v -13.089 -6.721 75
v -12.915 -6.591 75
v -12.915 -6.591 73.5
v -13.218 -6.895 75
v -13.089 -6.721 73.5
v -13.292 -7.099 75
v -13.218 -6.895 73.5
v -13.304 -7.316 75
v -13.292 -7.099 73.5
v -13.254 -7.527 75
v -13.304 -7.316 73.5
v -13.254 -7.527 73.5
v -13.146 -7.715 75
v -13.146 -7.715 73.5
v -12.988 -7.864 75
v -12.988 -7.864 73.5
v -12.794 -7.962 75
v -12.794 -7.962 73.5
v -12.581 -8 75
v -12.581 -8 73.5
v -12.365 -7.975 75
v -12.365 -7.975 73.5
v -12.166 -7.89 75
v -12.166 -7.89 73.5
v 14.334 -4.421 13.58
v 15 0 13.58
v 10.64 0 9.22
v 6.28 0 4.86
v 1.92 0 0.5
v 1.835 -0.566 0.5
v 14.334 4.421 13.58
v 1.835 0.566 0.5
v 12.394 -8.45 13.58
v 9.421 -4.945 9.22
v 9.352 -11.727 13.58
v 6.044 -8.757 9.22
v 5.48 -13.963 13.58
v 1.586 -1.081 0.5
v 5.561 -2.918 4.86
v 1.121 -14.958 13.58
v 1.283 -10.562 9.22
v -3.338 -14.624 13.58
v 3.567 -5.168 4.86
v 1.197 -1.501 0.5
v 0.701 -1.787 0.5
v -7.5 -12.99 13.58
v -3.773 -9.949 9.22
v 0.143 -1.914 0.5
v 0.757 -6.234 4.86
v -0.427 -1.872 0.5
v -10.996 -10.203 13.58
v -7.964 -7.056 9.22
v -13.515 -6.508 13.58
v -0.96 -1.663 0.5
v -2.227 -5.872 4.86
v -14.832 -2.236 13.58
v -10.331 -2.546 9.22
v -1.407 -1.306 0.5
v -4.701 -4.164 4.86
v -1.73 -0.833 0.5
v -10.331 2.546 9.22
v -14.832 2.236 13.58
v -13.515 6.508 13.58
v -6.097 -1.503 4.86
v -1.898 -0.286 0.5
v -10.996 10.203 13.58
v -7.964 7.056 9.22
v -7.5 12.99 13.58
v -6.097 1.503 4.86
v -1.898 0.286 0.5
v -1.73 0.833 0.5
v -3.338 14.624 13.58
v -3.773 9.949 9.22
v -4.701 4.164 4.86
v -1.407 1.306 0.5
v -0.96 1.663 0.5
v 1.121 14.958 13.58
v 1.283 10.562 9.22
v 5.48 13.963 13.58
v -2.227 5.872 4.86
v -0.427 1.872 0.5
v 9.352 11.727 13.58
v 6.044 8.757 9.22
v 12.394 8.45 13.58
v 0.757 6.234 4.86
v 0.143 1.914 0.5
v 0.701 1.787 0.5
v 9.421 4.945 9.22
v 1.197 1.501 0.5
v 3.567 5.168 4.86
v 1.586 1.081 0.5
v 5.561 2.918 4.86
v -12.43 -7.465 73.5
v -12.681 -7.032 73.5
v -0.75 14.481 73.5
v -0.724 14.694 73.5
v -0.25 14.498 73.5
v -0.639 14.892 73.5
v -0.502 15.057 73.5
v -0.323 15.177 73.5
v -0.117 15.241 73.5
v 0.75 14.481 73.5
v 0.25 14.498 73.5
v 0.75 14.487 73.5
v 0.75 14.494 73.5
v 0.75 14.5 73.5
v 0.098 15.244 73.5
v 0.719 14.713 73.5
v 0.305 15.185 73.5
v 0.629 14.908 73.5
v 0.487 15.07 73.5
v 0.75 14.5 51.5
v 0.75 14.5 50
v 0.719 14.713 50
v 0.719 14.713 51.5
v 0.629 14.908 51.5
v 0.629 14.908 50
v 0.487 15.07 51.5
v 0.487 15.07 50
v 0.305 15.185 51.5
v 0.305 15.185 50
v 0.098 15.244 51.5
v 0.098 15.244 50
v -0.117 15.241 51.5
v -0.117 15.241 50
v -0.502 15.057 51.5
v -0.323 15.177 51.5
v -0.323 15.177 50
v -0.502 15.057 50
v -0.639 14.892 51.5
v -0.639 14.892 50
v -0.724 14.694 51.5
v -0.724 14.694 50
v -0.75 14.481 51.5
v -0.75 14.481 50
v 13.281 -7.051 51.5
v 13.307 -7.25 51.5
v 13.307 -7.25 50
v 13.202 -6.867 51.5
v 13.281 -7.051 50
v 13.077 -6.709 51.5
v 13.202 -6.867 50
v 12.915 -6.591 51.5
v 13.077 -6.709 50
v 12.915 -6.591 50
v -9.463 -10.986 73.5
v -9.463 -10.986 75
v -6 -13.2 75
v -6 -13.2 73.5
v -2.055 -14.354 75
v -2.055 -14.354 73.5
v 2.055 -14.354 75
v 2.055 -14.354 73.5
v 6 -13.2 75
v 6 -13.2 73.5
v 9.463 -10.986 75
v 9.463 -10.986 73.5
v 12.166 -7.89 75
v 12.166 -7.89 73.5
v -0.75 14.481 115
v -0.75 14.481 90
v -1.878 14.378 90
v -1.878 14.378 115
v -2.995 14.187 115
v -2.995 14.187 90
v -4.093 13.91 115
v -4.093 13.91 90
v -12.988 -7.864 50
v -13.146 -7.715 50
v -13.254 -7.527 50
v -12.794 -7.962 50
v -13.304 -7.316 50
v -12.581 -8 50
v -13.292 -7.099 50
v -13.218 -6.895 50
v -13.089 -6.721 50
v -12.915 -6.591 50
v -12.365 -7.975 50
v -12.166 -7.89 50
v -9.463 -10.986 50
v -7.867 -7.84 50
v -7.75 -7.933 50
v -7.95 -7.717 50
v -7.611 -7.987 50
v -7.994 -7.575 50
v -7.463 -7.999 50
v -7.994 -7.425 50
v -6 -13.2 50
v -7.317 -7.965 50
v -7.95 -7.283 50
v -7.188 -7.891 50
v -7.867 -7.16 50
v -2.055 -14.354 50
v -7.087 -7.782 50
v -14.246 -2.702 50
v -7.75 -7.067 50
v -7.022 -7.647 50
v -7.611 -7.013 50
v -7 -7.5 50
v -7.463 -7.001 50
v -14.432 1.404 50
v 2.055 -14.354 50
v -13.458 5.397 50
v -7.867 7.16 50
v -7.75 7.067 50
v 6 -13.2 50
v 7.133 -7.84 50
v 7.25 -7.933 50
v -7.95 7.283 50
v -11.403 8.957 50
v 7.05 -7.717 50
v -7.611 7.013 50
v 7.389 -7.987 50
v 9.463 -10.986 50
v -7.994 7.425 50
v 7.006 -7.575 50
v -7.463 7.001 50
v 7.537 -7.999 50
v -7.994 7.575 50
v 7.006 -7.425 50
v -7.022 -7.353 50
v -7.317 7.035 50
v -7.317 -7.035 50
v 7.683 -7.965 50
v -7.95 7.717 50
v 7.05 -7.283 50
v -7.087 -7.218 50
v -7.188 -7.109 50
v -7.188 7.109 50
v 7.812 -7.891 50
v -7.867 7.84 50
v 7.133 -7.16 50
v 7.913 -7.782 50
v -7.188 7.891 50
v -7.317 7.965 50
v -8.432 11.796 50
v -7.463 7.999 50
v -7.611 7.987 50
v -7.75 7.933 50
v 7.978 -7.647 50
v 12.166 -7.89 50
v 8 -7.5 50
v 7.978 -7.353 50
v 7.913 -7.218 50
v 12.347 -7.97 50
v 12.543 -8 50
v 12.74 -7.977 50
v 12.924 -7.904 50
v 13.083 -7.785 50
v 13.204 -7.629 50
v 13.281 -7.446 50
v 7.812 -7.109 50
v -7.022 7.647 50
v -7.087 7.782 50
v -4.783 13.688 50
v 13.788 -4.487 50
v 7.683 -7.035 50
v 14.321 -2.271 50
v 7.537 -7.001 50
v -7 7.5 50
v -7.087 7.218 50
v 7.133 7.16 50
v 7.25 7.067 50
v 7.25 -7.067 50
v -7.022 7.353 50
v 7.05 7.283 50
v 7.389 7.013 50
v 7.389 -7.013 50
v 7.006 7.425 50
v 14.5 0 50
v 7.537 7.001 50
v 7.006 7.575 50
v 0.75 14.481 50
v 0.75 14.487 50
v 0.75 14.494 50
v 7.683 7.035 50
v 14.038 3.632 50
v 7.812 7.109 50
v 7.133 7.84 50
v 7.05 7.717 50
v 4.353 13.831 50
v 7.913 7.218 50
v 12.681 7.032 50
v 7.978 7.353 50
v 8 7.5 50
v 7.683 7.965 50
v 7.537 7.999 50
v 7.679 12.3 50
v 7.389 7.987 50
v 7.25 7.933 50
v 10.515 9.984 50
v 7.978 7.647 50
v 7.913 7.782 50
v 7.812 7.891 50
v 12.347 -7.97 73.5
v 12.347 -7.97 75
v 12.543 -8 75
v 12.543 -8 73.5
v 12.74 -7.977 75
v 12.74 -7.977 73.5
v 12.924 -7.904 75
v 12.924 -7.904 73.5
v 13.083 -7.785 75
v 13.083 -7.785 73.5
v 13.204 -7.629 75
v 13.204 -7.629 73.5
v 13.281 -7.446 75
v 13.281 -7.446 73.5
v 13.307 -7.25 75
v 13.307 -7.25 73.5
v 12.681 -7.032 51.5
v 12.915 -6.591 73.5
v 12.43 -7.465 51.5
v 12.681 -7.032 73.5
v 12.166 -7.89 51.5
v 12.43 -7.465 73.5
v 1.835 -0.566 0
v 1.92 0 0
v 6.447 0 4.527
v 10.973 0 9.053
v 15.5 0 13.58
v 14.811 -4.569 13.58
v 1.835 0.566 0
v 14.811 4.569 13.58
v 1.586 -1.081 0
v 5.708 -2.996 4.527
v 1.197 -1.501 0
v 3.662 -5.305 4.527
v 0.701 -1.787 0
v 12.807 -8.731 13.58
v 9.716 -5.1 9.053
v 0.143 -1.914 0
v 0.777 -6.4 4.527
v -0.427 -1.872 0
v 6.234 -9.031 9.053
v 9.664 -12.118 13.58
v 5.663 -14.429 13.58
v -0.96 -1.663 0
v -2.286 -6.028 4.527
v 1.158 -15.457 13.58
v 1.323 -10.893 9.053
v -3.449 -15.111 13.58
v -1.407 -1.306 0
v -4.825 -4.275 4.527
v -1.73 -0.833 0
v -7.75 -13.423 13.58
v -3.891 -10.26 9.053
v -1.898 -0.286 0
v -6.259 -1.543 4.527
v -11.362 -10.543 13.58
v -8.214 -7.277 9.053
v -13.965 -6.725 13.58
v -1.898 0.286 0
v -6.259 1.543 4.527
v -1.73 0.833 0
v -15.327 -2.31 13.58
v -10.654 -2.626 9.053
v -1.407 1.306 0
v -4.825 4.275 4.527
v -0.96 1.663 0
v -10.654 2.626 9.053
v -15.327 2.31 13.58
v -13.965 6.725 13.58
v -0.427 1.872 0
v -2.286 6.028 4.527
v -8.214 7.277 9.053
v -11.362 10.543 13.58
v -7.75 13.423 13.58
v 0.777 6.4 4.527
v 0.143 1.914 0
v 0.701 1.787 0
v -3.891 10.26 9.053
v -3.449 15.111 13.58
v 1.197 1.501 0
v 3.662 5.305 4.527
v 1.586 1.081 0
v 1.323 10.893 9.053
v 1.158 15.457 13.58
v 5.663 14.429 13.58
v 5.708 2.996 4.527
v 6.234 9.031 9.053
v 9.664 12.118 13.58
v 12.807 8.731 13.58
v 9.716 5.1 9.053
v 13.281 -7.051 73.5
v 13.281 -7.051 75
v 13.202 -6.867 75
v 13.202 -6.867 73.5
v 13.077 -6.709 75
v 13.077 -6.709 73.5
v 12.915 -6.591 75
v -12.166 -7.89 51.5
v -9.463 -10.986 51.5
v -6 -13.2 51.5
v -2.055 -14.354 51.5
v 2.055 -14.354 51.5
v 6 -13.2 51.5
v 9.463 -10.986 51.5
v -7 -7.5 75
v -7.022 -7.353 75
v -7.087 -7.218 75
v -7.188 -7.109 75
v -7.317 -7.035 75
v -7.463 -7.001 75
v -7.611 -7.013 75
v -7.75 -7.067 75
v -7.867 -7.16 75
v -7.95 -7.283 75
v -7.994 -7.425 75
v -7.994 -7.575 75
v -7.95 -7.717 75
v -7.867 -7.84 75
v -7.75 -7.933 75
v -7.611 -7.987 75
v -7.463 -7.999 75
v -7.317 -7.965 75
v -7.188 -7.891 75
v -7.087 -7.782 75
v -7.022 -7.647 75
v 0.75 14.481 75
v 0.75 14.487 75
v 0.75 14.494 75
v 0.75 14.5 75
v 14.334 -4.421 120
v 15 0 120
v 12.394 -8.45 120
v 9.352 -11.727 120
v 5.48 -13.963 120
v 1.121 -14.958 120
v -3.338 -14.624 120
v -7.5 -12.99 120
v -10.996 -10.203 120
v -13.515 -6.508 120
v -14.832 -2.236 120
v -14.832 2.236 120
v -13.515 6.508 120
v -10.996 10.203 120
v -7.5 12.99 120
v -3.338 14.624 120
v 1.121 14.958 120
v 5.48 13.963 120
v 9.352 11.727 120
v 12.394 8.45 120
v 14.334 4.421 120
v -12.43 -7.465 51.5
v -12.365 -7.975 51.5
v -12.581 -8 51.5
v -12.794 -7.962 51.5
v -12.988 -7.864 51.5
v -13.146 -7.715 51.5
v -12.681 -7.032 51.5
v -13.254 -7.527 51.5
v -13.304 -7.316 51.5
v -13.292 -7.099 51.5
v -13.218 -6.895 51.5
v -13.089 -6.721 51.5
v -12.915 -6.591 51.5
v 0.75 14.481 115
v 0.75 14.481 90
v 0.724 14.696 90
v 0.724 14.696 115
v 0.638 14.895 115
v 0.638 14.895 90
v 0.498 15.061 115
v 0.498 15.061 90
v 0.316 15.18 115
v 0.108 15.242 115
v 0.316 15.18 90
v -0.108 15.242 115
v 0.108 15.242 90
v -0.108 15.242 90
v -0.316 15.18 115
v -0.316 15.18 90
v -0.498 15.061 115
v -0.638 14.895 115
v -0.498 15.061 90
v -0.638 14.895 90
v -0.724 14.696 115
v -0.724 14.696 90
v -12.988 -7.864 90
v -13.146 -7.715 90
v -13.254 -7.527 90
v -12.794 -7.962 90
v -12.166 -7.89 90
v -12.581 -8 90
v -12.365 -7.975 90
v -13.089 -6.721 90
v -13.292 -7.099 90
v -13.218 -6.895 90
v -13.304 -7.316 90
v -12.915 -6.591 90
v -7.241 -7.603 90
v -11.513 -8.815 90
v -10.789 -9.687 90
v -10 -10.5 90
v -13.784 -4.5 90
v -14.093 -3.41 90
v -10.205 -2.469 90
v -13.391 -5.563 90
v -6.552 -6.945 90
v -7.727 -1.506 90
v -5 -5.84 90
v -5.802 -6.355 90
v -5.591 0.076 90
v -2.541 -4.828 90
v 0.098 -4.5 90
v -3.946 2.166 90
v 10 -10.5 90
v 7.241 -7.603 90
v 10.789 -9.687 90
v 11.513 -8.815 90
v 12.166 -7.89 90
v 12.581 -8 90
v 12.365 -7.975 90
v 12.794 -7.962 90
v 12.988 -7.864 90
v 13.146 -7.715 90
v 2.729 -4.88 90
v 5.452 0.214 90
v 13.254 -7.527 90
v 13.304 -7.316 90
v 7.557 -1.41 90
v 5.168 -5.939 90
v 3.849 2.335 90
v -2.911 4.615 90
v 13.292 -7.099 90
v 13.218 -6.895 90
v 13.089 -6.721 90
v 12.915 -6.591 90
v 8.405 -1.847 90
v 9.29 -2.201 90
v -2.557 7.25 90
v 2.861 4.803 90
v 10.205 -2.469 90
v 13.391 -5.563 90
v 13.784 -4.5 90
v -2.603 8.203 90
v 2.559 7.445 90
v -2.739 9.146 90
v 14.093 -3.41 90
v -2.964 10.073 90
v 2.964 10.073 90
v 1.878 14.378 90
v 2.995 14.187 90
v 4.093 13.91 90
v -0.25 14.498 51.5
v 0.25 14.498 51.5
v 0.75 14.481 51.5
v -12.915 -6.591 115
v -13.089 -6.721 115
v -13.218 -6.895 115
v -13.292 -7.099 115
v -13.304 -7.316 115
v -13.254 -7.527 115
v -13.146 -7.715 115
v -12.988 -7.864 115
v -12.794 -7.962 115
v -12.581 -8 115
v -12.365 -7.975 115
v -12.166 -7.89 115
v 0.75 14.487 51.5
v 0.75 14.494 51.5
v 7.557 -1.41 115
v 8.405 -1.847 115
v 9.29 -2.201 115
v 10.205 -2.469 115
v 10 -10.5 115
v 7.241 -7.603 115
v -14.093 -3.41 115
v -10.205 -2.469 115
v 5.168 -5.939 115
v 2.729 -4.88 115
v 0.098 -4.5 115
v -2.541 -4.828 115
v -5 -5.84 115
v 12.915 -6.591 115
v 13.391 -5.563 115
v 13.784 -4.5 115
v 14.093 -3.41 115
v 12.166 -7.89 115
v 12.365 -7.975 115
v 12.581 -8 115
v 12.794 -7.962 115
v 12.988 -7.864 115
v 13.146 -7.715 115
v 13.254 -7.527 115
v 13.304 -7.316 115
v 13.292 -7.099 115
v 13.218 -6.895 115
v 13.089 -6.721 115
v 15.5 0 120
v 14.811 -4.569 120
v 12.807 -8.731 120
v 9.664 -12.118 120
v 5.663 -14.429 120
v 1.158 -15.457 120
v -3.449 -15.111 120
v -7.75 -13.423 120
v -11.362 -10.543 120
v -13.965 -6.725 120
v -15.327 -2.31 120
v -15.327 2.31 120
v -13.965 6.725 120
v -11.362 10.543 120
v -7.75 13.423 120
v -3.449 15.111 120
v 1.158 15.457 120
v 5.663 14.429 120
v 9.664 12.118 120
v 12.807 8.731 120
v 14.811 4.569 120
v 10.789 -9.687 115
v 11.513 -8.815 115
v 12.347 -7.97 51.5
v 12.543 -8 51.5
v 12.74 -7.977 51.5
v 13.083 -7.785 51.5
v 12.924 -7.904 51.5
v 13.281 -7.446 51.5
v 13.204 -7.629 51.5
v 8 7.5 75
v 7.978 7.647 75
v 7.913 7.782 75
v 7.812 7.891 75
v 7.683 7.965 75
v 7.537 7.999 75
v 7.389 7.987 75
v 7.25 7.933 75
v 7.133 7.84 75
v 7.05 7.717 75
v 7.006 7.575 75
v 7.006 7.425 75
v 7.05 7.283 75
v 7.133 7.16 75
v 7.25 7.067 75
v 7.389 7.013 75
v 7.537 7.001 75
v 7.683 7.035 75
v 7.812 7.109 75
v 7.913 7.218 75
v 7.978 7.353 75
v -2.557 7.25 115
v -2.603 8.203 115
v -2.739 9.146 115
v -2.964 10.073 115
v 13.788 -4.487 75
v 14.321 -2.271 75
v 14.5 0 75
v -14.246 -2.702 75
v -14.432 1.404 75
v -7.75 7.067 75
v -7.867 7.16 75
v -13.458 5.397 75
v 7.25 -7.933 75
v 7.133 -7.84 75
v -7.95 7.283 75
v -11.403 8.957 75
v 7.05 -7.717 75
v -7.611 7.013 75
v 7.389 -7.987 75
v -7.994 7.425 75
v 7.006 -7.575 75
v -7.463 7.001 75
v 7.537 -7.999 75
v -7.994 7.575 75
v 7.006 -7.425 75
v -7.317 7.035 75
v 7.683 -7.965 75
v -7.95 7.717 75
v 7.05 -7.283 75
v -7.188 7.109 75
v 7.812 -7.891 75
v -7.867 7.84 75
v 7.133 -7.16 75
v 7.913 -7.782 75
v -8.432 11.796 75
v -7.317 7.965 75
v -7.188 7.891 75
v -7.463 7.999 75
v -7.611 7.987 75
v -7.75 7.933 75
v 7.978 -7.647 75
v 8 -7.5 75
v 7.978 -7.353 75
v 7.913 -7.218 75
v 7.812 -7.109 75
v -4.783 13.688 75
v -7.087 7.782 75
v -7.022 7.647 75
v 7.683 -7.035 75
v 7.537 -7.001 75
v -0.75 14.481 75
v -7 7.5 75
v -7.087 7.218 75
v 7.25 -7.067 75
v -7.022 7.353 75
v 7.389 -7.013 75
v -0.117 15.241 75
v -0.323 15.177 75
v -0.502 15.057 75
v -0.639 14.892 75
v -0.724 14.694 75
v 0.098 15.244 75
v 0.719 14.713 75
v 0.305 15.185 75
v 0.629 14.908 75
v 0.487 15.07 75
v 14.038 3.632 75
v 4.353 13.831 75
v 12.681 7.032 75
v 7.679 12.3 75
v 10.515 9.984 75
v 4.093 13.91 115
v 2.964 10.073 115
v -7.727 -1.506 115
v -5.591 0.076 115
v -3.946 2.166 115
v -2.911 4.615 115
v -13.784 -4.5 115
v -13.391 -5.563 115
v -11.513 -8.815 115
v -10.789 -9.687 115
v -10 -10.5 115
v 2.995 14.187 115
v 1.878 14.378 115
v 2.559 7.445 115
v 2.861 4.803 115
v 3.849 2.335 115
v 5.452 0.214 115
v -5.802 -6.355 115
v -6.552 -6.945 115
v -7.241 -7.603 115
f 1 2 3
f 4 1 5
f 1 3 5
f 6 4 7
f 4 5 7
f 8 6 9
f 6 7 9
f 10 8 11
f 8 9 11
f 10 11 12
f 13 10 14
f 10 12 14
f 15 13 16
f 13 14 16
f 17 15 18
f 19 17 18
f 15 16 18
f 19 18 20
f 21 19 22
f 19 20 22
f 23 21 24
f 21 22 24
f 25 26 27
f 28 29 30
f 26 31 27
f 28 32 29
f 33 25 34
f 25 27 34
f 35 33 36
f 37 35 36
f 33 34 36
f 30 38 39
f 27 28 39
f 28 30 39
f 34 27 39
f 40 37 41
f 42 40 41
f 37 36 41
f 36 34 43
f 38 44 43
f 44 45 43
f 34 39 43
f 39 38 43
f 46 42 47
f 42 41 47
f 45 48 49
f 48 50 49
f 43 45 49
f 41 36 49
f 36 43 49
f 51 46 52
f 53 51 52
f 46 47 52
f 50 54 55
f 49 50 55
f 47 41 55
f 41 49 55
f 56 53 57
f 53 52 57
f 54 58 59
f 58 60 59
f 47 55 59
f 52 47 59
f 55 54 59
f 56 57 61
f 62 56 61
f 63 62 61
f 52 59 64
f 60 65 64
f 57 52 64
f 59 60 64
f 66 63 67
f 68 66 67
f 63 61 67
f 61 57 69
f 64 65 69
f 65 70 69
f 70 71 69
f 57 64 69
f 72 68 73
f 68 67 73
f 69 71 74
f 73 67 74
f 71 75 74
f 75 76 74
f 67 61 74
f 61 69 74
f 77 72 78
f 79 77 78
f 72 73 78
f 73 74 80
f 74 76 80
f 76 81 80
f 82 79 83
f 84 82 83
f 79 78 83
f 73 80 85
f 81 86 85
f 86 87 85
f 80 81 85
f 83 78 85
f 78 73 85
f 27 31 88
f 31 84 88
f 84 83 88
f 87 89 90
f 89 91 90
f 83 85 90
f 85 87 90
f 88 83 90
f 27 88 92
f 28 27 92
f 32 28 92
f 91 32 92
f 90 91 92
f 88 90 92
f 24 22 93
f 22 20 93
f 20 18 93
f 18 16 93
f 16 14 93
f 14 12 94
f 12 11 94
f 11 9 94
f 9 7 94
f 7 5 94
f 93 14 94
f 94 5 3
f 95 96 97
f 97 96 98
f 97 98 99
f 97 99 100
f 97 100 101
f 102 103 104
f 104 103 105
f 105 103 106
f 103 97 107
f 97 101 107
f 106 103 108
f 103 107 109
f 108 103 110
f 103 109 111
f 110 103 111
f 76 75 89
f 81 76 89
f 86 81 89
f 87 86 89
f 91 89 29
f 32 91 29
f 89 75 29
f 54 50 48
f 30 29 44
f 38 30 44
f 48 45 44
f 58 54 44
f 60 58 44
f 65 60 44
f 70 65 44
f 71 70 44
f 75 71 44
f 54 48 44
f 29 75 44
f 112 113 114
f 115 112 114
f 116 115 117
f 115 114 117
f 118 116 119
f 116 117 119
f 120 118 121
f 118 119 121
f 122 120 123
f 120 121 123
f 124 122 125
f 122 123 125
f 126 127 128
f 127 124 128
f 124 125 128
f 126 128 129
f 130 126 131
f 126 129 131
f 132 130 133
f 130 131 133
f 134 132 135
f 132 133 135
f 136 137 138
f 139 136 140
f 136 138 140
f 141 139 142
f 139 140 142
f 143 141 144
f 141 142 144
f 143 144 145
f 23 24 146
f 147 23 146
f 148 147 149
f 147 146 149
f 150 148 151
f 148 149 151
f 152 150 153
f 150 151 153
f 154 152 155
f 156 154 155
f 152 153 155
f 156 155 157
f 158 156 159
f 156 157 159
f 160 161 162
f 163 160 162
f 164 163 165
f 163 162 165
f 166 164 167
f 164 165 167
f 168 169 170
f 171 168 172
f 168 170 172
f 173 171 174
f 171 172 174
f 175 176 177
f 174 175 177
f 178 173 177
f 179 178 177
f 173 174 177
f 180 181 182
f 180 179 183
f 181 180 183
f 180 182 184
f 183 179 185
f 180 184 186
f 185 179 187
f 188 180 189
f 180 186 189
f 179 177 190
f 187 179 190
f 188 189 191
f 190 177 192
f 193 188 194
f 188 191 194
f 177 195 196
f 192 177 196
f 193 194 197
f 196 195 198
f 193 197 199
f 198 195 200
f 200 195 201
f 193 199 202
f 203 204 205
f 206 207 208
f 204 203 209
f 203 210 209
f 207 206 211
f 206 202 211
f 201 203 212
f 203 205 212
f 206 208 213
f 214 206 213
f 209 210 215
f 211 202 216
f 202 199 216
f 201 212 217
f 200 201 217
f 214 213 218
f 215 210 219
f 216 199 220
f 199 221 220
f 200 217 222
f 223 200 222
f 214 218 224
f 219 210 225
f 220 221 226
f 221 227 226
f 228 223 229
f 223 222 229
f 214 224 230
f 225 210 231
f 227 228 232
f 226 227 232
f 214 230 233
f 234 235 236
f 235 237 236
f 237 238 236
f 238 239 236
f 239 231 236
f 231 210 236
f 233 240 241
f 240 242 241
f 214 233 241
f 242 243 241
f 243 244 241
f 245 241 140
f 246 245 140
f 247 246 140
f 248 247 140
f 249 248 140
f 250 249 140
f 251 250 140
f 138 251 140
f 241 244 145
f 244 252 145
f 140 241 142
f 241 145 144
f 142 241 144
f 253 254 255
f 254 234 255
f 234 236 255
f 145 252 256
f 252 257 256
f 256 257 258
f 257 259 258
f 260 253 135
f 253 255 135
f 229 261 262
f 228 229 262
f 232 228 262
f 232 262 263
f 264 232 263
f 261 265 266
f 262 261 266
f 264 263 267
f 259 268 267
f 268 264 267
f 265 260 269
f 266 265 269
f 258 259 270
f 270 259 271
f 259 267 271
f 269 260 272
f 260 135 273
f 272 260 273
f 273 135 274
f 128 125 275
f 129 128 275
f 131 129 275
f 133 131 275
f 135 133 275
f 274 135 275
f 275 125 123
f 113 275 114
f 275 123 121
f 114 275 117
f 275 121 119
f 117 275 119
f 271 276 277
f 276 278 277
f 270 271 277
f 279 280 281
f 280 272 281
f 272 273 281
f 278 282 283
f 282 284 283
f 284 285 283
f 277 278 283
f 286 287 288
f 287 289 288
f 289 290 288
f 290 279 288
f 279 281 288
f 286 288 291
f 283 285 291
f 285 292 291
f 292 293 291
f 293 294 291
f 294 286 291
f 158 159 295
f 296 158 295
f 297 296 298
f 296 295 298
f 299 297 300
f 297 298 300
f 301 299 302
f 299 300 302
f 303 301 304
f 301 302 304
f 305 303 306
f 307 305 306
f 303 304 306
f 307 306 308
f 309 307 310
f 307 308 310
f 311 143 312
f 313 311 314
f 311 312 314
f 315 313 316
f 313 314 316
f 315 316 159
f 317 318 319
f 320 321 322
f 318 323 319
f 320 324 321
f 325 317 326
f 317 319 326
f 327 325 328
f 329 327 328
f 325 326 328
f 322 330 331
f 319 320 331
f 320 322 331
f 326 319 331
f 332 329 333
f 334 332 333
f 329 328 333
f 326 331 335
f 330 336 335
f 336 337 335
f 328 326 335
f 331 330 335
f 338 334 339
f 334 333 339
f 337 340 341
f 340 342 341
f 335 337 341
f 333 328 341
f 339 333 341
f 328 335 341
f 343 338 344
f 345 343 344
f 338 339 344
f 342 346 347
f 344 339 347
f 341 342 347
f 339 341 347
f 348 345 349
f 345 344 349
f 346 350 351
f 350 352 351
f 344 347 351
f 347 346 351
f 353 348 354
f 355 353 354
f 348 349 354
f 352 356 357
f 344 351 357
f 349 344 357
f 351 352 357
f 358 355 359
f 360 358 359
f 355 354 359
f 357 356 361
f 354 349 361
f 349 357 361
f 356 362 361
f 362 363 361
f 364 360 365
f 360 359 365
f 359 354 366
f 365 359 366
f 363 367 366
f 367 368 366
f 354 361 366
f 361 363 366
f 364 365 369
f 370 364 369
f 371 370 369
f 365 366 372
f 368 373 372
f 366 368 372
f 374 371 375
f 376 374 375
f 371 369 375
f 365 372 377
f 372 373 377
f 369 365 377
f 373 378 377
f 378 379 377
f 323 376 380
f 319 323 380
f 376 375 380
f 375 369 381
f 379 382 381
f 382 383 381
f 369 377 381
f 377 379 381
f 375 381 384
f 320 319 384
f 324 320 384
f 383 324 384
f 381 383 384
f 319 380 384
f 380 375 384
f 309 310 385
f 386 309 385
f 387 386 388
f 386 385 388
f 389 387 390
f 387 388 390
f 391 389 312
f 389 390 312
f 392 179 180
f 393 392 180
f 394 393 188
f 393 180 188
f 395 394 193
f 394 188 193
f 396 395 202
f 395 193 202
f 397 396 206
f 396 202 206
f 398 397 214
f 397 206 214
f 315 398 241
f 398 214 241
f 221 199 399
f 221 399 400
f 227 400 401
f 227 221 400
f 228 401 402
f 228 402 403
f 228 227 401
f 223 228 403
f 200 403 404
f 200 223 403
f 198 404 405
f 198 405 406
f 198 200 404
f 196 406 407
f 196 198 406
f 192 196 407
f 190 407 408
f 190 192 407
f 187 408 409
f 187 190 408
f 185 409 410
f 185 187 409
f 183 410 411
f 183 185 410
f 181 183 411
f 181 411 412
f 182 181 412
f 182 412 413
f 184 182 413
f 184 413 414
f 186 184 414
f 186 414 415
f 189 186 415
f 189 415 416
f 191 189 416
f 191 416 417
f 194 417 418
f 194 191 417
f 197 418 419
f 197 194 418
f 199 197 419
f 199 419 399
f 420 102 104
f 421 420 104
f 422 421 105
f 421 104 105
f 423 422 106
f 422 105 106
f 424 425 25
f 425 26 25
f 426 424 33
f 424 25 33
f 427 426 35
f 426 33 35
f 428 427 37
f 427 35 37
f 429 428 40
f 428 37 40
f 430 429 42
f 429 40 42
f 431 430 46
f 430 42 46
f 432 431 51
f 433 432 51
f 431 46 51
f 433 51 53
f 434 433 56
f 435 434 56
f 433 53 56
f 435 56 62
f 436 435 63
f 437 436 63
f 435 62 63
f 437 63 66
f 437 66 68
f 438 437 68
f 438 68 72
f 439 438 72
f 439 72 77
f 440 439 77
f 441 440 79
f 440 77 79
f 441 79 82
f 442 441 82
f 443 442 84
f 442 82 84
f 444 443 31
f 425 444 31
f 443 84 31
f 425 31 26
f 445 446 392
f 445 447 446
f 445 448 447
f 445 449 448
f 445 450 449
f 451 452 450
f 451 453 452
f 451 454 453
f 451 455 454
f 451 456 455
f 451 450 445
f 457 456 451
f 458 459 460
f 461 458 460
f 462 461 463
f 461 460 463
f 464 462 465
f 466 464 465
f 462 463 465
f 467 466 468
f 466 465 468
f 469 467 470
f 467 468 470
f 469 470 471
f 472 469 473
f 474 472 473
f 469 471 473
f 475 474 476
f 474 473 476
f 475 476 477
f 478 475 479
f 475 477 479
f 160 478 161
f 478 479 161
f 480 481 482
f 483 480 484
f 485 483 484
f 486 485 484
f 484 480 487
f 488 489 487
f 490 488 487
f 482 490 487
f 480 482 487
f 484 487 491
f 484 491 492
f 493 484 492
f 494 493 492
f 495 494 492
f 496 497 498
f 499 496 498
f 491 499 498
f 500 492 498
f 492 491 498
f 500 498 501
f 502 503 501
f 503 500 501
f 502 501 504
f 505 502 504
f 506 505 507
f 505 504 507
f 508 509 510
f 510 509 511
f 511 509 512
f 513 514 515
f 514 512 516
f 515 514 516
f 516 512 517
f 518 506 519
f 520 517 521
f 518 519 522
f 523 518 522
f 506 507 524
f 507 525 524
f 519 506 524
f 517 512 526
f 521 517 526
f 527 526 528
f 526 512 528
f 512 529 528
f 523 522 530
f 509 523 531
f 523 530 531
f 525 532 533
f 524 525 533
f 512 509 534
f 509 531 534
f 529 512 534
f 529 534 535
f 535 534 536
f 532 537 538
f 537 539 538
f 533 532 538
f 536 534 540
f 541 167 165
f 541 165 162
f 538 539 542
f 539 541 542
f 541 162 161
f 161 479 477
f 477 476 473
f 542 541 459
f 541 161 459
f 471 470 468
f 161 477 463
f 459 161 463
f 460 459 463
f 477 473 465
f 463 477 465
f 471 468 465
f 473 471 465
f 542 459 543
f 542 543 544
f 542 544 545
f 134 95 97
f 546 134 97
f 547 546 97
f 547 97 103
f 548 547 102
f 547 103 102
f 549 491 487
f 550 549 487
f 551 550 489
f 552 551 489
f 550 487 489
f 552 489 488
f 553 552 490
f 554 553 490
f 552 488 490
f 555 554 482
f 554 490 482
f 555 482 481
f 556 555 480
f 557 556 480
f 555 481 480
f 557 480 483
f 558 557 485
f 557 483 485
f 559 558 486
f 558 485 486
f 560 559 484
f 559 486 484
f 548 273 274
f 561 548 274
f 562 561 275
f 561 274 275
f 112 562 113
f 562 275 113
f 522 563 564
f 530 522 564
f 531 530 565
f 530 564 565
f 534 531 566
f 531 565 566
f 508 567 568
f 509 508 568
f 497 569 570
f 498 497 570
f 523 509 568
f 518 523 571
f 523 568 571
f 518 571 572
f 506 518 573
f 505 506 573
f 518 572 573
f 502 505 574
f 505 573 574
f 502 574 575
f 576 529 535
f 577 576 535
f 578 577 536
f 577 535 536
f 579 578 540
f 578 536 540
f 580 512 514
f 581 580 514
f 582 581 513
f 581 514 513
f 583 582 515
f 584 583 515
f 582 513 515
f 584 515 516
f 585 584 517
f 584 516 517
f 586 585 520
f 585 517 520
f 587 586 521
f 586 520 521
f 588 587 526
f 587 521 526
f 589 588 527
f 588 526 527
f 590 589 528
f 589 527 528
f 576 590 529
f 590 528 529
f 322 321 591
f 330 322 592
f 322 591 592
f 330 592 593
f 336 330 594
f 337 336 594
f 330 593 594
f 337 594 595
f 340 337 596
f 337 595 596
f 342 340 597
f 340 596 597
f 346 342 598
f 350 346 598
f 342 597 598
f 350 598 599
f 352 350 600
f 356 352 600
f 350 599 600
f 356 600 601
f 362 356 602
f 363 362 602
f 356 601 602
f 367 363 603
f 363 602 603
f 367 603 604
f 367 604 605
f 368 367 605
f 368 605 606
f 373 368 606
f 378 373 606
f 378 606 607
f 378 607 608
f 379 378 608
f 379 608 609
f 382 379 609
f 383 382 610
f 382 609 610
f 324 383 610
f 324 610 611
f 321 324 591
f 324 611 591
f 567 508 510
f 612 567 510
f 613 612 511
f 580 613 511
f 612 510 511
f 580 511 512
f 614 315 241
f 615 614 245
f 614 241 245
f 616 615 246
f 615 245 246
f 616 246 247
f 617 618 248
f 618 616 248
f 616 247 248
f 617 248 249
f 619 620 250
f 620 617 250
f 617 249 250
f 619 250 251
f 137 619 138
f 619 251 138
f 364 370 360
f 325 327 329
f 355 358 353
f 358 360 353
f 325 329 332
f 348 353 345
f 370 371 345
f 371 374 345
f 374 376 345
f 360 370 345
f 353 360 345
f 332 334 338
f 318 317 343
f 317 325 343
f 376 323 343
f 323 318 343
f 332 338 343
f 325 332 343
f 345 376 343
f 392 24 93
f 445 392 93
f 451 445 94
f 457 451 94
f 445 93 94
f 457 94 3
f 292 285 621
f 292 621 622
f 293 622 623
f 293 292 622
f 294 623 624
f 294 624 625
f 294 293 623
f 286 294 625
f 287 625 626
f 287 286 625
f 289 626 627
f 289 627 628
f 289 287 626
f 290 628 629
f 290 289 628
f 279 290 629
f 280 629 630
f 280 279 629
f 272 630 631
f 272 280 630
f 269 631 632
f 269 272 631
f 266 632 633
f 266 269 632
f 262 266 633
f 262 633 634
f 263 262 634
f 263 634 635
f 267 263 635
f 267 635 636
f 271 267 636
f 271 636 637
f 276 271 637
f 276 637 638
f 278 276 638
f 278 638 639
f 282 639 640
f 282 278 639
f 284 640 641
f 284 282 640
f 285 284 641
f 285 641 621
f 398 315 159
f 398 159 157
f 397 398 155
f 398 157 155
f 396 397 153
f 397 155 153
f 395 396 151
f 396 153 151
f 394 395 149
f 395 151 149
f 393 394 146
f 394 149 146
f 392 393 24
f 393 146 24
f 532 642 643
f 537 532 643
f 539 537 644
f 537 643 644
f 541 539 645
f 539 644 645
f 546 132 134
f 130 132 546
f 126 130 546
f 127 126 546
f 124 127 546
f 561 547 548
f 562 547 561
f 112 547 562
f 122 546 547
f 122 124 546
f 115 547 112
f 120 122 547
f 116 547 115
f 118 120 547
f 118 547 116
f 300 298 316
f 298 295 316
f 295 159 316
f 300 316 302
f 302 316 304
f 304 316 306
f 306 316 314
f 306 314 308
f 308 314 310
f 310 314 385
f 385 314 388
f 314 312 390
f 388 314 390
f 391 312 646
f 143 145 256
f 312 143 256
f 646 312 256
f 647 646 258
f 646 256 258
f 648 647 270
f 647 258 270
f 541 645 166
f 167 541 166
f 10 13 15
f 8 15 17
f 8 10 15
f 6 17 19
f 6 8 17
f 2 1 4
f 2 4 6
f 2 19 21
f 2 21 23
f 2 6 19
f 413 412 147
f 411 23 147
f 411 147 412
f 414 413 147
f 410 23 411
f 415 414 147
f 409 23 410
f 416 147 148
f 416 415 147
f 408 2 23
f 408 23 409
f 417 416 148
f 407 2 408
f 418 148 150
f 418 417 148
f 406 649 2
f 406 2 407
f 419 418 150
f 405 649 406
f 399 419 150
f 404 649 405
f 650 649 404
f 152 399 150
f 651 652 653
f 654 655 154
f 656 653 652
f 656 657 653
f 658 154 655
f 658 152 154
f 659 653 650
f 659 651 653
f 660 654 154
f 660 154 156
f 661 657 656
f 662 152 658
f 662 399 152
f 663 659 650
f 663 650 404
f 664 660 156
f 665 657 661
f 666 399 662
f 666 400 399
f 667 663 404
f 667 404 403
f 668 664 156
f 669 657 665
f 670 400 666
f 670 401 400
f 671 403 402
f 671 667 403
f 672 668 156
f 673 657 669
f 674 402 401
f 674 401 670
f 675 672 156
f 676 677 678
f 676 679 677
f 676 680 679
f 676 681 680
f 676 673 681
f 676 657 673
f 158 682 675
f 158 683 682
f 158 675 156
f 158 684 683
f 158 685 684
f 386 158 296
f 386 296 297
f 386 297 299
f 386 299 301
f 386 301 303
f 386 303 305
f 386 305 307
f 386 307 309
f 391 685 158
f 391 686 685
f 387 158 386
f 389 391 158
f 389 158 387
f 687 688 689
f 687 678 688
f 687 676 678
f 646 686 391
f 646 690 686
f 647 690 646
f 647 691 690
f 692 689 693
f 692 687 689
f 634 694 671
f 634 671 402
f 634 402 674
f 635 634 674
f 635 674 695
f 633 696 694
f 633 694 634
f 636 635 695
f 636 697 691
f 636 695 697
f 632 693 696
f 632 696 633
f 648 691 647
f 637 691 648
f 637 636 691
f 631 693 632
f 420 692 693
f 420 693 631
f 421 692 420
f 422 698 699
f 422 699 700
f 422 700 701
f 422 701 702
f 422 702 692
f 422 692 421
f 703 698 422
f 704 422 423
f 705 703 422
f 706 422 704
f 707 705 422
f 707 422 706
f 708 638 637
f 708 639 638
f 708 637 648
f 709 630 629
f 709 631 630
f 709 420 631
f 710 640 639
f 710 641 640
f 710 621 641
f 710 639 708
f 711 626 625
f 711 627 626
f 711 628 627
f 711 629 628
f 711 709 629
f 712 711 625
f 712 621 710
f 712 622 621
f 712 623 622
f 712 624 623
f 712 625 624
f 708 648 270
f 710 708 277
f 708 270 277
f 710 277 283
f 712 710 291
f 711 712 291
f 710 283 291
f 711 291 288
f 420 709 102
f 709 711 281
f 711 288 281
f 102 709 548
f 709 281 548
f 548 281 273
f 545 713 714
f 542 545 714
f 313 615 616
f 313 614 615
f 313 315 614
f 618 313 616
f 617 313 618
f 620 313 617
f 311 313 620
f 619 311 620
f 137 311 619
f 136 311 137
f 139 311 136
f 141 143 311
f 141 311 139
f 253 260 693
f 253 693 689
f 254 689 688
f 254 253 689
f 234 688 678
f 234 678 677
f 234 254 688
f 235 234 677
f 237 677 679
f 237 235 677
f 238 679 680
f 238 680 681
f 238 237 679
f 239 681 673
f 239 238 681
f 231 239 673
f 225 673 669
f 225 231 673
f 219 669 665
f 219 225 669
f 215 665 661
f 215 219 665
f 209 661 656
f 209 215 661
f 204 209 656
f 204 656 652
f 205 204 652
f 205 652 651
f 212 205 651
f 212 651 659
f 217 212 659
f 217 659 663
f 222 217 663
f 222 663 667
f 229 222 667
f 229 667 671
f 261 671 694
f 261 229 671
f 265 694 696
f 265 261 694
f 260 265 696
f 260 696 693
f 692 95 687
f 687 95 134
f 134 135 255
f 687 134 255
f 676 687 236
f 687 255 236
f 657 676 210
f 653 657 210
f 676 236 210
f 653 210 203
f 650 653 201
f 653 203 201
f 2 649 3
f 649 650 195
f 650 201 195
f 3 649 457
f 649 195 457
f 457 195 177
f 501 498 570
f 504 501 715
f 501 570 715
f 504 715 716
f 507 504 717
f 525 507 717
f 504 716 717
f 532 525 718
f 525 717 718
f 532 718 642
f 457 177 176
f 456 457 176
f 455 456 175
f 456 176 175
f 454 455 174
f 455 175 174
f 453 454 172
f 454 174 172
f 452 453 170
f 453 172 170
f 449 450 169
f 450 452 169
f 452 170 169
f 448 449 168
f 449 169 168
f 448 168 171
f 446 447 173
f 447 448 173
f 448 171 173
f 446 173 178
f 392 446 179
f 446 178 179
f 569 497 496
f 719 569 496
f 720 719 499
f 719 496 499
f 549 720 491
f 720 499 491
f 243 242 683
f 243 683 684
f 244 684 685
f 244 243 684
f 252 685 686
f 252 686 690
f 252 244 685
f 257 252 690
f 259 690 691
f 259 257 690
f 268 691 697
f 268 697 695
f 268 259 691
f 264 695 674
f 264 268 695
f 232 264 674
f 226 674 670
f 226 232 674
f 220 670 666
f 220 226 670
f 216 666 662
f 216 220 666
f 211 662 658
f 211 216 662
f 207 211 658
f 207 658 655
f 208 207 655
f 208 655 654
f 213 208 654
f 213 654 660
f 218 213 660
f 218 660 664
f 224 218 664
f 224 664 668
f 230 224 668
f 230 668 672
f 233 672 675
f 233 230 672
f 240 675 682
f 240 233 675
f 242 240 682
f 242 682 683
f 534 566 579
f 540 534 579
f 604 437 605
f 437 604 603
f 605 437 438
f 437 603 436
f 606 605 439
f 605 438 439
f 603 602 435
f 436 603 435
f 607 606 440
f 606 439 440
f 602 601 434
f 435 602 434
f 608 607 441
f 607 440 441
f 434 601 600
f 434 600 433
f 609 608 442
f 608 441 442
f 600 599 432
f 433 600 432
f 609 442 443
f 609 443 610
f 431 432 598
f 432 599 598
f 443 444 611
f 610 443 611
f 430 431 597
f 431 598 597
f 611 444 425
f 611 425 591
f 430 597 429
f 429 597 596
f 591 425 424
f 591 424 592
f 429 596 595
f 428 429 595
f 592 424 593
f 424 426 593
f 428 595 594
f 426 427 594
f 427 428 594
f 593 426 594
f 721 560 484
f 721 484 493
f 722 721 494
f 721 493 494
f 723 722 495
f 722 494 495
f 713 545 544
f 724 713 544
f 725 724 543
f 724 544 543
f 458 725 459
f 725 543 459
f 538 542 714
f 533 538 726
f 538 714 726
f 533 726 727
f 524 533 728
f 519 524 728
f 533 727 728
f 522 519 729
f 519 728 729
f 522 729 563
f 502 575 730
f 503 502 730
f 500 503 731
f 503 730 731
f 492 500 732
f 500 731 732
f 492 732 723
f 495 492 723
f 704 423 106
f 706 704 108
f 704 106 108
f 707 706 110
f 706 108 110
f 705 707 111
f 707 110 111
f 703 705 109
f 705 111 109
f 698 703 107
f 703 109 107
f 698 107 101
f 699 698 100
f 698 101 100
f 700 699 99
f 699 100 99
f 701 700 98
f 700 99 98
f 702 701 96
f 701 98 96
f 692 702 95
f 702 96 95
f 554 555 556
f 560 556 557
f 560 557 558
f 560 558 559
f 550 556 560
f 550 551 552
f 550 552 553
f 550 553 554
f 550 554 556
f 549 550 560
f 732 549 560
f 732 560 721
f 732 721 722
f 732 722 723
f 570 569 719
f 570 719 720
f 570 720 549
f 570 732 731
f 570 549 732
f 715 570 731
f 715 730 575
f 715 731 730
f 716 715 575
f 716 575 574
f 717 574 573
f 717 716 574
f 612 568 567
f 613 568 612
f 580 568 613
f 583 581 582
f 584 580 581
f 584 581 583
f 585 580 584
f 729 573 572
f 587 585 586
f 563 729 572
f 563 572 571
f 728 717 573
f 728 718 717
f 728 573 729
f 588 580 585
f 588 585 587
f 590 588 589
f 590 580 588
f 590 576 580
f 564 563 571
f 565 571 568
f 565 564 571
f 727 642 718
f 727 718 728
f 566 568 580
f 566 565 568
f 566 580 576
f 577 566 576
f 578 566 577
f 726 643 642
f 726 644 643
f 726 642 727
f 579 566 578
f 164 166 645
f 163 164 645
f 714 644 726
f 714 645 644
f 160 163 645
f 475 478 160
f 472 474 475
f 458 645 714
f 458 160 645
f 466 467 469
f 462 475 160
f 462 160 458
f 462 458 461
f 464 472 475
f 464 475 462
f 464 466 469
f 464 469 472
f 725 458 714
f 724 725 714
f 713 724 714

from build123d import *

# Parameters (mm, degrees)
F3_R            = 0.5
F4_DEPTH        = 25
F6_R            = 1.517812702
F7_DEPTH        = 25
F8_R            = 1.517812702
F9_DEPTH        = 25
F9_COPIES_COUNT = 3
F12_R           = 20.7909194511
F13_DEPTH       = 22


# Not quite as in the source:
# - a pattern or mirror of a feature is missing from the dataset's text; its kind, count and spacing are read off the source's solid


with BuildPart() as f1:
    # F0 (on Front) → F1 (revolve)
    with BuildSketch(Plane.XZ):
        Polygon((0, 0.5), (0, 0), (1.9198461069, 0), (15.5, 13.5801538931), (15.5, 120), (15, 120), (15, 13.5801538931), (1.9198461069, 0.5), align=None)
    revolve(axis=Axis((0, 0, 0.25), (0, 0, -1)))


with BuildPart() as f4:
    # F3 (on offset) → F4 (new body)
    with BuildSketch(Plane.XY.offset(50)):
        with BuildLine():
            ThreePointArc((12.9154450186, -6.5909999219), (14.0982969321, -3.38939871), (14.5, 0))
            ThreePointArc((14.5, 0), (10.5147839383, 9.9844538524), (0.7497491406, 14.4806034483))
            ThreePointArc((0.7497491406, 14.4806034483), (0, 13.75), (-0.7497491406, 14.4806034483))
            ThreePointArc((-0.7497491406, 14.4806034483), (-12.5573683549, 7.25), (-12.9154450186, -6.5909999219))
            ThreePointArc((-12.9154450186, -6.5909999219), (-12.1740000579, -6.6053848056), (-11.8073683549, -7.25))
            ThreePointArc((-11.8073683549, -7.25), (-11.9030540735, -7.6165689856), (-12.1656958781, -7.8896035263))
            ThreePointArc((-12.1656958781, -7.8896035263), (0, -14.5), (12.1656958781, -7.8896035263))
            ThreePointArc((12.1656958781, -7.8896035263), (11.907849302, -6.875), (12.9154450186, -6.5909999219))
        make_face()
        with Locations((-7.5, -7.5)):
            Circle(F3_R, mode=Mode.SUBTRACT)
        with Locations((7.5, -7.5)):
            Circle(F3_R, mode=Mode.SUBTRACT)
        with Locations((-7.5, 7.5)):
            Circle(F3_R, mode=Mode.SUBTRACT)
        with Locations((7.5, 7.5)):
            Circle(F3_R, mode=Mode.SUBTRACT)
        with BuildLine():
            ThreePointArc((-0.7497491406, 14.4806034483), (0, 13.75), (0.7497491406, 14.4806034483))
            ThreePointArc((0.7497491406, 14.4806034483), (0, 14.5), (-0.7497491406, 14.4806034483))
        make_face()
        with BuildLine():
            ThreePointArc((-0.7497491406, 14.4806034483), (0, 14.5), (0.7497491406, 14.4806034483))
            ThreePointArc((0.7497491406, 14.4806034483), (0.7499372825, 14.4903009131), (0.75, 14.5))
            ThreePointArc((0.75, 14.5), (-0.0096990869, 15.2499372825), (-0.7497491406, 14.4806034483))
        make_face()
        with BuildLine():
            ThreePointArc((13.3073683549, -7.25), (13.2019835493, -6.8666317031), (12.9154450186, -6.5909999219))
            ThreePointArc((12.9154450186, -6.5909999219), (12.5573683549, -7.25), (12.1656958781, -7.8896035263))
            ThreePointArc((12.1656958781, -7.8896035263), (12.9239373405, -7.9043142814), (13.3073683549, -7.25))
        make_face()
        with BuildLine():
            ThreePointArc((12.1656958781, -7.8896035263), (12.5573683549, -7.25), (12.9154450186, -6.5909999219))
            ThreePointArc((12.9154450186, -6.5909999219), (11.907849302, -6.875), (12.1656958781, -7.8896035263))
        make_face()
        with BuildLine():
            ThreePointArc((-11.8073683549, -7.25), (-12.1740000579, -6.6053848056), (-12.9154450186, -6.5909999219))
            ThreePointArc((-12.9154450186, -6.5909999219), (-12.5573683549, -7.25), (-12.1656958781, -7.8896035263))
            ThreePointArc((-12.1656958781, -7.8896035263), (-11.9030540735, -7.6165689856), (-11.8073683549, -7.25))
        make_face()
        with BuildLine():
            ThreePointArc((-12.1656958781, -7.8896035263), (-12.5573683549, -7.25), (-12.9154450186, -6.5909999219))
            ThreePointArc((-12.9154450186, -6.5909999219), (-13.2068874077, -7.625), (-12.1656958781, -7.8896035263))
        make_face()
    extrude(amount=F4_DEPTH)

    # F12 (on offset) → F13 (cut, through all)
    with BuildSketch(Plane.XY.offset(73.5)):
        Circle(F12_R)
        with BuildLine():
            ThreePointArc((12.1656958781, -7.8896035263), (0, -14.5), (-12.1656958781, -7.8896035263))
            ThreePointArc((-12.1656958781, -7.8896035263), (-4.1138430797, 13.9041826482), (14.5, 0))
            ThreePointArc((14.5, 0), (13.9041826482, -4.1138430797), (12.1656958781, -7.8896035263))
        make_face(mode=Mode.SUBTRACT)
    extrude(amount=-F13_DEPTH, mode=Mode.SUBTRACT)


with BuildPart() as f7:
    # F6 (on offset) → F7 (new body)
    with BuildSketch(Plane.XY.offset(90)):
        with BuildLine():
            ThreePointArc((12.9154450186, -6.5909999219), (12.5573683549, 7.25), (0.7497491406, 14.4806034483))
            ThreePointArc((0.7497491406, 14.4806034483), (0, 15.25), (-0.7497491406, 14.4806034483))
            ThreePointArc((-0.7497491406, 14.4806034483), (-12.5573683549, 7.25), (-12.9154450186, -6.5909999219))
            ThreePointArc((-12.9154450186, -6.5909999219), (-13.2068874077, -7.625), (-12.1656958781, -7.8896035263))
            ThreePointArc((-12.1656958781, -7.8896035263), (0, -14.5), (12.1656958781, -7.8896035263))
            ThreePointArc((12.1656958781, -7.8896035263), (13.2068874077, -7.625), (12.9154450186, -6.5909999219))
        make_face()
        with Locations((-7.5, 7.5)):
            Circle(F6_R, mode=Mode.SUBTRACT)
    extrude(amount=F7_DEPTH)

    # F8 (on face) → F9 (cut)
    with BuildSketch(Plane.XY.offset(115)):
        with BuildLine():
            ThreePointArc((-14.2644040621, -2.6032242994), (-12.5573683549, 7.25), (-4.877743656, 13.6549484373))
            ThreePointArc((-4.877743656, 13.6549484373), (-21.2176223927, 12.25), (-14.2644040621, -2.6032242994))
        make_face()
        with BuildLine():
            ThreePointArc((-10.2054687337, -2.4694942344), (-4.6986472053, 1.0661094856), (-2.5573683549, 7.25))
            ThreePointArc((-2.5573683549, 7.25), (-2.6595709496, 8.6760457652), (-2.9640896598, 10.072942415))
            ThreePointArc((-2.9640896598, 10.072942415), (-3.7371648595, 11.9621131459), (-4.877743656, 13.6549484373))
            ThreePointArc((-4.877743656, 13.6549484373), (-12.5573683549, 7.25), (-14.2644040621, -2.6032242994))
            ThreePointArc((-14.2644040621, -2.6032242994), (-12.2280762361, -2.7445768645), (-10.2054687337, -2.4694942344))
        make_face()
        with Locations((-7.5, 7.5)):
            Circle(F8_R, mode=Mode.SUBTRACT)
        with Locations((-7.5, 7.5)):
            Circle(F8_R)
        with BuildLine():
            ThreePointArc((-4.877743656, 13.6549484373), (-3.7371648595, 11.9621131459), (-2.9640896598, 10.072942415))
            Line((-2.9640896598, 10.072942415), (-4.0932667397, 13.9102540378))
            ThreePointArc((-4.0932667397, 13.9102540378), (-4.487321263, 13.7881814567), (-4.877743656, 13.6549484373))
        make_face()
        with BuildLine():
            Line((-14.0932667397, -3.4102540378), (-10.2054687337, -2.4694942344))
            ThreePointArc((-10.2054687337, -2.4694942344), (-12.2280762361, -2.7445768645), (-14.2644040621, -2.6032242994))
            ThreePointArc((-14.2644040621, -2.6032242994), (-14.184576045, -3.0079565196), (-14.0932667397, -3.4102540378))
        make_face()
    f9 = extrude(amount=-F9_DEPTH, mode=Mode.SUBTRACT)

    # F9_copies: F9 ×3 about axis
    f9_copies_axis = Axis((0, 0, 0), (0, 0, 1))
    for i in range(1, F9_COPIES_COUNT):
        add(f9.rotate(f9_copies_axis, i * 360 / F9_COPIES_COUNT), mode=Mode.SUBTRACT)


solid = Compound([f1.part, f4.part, f7.part])
